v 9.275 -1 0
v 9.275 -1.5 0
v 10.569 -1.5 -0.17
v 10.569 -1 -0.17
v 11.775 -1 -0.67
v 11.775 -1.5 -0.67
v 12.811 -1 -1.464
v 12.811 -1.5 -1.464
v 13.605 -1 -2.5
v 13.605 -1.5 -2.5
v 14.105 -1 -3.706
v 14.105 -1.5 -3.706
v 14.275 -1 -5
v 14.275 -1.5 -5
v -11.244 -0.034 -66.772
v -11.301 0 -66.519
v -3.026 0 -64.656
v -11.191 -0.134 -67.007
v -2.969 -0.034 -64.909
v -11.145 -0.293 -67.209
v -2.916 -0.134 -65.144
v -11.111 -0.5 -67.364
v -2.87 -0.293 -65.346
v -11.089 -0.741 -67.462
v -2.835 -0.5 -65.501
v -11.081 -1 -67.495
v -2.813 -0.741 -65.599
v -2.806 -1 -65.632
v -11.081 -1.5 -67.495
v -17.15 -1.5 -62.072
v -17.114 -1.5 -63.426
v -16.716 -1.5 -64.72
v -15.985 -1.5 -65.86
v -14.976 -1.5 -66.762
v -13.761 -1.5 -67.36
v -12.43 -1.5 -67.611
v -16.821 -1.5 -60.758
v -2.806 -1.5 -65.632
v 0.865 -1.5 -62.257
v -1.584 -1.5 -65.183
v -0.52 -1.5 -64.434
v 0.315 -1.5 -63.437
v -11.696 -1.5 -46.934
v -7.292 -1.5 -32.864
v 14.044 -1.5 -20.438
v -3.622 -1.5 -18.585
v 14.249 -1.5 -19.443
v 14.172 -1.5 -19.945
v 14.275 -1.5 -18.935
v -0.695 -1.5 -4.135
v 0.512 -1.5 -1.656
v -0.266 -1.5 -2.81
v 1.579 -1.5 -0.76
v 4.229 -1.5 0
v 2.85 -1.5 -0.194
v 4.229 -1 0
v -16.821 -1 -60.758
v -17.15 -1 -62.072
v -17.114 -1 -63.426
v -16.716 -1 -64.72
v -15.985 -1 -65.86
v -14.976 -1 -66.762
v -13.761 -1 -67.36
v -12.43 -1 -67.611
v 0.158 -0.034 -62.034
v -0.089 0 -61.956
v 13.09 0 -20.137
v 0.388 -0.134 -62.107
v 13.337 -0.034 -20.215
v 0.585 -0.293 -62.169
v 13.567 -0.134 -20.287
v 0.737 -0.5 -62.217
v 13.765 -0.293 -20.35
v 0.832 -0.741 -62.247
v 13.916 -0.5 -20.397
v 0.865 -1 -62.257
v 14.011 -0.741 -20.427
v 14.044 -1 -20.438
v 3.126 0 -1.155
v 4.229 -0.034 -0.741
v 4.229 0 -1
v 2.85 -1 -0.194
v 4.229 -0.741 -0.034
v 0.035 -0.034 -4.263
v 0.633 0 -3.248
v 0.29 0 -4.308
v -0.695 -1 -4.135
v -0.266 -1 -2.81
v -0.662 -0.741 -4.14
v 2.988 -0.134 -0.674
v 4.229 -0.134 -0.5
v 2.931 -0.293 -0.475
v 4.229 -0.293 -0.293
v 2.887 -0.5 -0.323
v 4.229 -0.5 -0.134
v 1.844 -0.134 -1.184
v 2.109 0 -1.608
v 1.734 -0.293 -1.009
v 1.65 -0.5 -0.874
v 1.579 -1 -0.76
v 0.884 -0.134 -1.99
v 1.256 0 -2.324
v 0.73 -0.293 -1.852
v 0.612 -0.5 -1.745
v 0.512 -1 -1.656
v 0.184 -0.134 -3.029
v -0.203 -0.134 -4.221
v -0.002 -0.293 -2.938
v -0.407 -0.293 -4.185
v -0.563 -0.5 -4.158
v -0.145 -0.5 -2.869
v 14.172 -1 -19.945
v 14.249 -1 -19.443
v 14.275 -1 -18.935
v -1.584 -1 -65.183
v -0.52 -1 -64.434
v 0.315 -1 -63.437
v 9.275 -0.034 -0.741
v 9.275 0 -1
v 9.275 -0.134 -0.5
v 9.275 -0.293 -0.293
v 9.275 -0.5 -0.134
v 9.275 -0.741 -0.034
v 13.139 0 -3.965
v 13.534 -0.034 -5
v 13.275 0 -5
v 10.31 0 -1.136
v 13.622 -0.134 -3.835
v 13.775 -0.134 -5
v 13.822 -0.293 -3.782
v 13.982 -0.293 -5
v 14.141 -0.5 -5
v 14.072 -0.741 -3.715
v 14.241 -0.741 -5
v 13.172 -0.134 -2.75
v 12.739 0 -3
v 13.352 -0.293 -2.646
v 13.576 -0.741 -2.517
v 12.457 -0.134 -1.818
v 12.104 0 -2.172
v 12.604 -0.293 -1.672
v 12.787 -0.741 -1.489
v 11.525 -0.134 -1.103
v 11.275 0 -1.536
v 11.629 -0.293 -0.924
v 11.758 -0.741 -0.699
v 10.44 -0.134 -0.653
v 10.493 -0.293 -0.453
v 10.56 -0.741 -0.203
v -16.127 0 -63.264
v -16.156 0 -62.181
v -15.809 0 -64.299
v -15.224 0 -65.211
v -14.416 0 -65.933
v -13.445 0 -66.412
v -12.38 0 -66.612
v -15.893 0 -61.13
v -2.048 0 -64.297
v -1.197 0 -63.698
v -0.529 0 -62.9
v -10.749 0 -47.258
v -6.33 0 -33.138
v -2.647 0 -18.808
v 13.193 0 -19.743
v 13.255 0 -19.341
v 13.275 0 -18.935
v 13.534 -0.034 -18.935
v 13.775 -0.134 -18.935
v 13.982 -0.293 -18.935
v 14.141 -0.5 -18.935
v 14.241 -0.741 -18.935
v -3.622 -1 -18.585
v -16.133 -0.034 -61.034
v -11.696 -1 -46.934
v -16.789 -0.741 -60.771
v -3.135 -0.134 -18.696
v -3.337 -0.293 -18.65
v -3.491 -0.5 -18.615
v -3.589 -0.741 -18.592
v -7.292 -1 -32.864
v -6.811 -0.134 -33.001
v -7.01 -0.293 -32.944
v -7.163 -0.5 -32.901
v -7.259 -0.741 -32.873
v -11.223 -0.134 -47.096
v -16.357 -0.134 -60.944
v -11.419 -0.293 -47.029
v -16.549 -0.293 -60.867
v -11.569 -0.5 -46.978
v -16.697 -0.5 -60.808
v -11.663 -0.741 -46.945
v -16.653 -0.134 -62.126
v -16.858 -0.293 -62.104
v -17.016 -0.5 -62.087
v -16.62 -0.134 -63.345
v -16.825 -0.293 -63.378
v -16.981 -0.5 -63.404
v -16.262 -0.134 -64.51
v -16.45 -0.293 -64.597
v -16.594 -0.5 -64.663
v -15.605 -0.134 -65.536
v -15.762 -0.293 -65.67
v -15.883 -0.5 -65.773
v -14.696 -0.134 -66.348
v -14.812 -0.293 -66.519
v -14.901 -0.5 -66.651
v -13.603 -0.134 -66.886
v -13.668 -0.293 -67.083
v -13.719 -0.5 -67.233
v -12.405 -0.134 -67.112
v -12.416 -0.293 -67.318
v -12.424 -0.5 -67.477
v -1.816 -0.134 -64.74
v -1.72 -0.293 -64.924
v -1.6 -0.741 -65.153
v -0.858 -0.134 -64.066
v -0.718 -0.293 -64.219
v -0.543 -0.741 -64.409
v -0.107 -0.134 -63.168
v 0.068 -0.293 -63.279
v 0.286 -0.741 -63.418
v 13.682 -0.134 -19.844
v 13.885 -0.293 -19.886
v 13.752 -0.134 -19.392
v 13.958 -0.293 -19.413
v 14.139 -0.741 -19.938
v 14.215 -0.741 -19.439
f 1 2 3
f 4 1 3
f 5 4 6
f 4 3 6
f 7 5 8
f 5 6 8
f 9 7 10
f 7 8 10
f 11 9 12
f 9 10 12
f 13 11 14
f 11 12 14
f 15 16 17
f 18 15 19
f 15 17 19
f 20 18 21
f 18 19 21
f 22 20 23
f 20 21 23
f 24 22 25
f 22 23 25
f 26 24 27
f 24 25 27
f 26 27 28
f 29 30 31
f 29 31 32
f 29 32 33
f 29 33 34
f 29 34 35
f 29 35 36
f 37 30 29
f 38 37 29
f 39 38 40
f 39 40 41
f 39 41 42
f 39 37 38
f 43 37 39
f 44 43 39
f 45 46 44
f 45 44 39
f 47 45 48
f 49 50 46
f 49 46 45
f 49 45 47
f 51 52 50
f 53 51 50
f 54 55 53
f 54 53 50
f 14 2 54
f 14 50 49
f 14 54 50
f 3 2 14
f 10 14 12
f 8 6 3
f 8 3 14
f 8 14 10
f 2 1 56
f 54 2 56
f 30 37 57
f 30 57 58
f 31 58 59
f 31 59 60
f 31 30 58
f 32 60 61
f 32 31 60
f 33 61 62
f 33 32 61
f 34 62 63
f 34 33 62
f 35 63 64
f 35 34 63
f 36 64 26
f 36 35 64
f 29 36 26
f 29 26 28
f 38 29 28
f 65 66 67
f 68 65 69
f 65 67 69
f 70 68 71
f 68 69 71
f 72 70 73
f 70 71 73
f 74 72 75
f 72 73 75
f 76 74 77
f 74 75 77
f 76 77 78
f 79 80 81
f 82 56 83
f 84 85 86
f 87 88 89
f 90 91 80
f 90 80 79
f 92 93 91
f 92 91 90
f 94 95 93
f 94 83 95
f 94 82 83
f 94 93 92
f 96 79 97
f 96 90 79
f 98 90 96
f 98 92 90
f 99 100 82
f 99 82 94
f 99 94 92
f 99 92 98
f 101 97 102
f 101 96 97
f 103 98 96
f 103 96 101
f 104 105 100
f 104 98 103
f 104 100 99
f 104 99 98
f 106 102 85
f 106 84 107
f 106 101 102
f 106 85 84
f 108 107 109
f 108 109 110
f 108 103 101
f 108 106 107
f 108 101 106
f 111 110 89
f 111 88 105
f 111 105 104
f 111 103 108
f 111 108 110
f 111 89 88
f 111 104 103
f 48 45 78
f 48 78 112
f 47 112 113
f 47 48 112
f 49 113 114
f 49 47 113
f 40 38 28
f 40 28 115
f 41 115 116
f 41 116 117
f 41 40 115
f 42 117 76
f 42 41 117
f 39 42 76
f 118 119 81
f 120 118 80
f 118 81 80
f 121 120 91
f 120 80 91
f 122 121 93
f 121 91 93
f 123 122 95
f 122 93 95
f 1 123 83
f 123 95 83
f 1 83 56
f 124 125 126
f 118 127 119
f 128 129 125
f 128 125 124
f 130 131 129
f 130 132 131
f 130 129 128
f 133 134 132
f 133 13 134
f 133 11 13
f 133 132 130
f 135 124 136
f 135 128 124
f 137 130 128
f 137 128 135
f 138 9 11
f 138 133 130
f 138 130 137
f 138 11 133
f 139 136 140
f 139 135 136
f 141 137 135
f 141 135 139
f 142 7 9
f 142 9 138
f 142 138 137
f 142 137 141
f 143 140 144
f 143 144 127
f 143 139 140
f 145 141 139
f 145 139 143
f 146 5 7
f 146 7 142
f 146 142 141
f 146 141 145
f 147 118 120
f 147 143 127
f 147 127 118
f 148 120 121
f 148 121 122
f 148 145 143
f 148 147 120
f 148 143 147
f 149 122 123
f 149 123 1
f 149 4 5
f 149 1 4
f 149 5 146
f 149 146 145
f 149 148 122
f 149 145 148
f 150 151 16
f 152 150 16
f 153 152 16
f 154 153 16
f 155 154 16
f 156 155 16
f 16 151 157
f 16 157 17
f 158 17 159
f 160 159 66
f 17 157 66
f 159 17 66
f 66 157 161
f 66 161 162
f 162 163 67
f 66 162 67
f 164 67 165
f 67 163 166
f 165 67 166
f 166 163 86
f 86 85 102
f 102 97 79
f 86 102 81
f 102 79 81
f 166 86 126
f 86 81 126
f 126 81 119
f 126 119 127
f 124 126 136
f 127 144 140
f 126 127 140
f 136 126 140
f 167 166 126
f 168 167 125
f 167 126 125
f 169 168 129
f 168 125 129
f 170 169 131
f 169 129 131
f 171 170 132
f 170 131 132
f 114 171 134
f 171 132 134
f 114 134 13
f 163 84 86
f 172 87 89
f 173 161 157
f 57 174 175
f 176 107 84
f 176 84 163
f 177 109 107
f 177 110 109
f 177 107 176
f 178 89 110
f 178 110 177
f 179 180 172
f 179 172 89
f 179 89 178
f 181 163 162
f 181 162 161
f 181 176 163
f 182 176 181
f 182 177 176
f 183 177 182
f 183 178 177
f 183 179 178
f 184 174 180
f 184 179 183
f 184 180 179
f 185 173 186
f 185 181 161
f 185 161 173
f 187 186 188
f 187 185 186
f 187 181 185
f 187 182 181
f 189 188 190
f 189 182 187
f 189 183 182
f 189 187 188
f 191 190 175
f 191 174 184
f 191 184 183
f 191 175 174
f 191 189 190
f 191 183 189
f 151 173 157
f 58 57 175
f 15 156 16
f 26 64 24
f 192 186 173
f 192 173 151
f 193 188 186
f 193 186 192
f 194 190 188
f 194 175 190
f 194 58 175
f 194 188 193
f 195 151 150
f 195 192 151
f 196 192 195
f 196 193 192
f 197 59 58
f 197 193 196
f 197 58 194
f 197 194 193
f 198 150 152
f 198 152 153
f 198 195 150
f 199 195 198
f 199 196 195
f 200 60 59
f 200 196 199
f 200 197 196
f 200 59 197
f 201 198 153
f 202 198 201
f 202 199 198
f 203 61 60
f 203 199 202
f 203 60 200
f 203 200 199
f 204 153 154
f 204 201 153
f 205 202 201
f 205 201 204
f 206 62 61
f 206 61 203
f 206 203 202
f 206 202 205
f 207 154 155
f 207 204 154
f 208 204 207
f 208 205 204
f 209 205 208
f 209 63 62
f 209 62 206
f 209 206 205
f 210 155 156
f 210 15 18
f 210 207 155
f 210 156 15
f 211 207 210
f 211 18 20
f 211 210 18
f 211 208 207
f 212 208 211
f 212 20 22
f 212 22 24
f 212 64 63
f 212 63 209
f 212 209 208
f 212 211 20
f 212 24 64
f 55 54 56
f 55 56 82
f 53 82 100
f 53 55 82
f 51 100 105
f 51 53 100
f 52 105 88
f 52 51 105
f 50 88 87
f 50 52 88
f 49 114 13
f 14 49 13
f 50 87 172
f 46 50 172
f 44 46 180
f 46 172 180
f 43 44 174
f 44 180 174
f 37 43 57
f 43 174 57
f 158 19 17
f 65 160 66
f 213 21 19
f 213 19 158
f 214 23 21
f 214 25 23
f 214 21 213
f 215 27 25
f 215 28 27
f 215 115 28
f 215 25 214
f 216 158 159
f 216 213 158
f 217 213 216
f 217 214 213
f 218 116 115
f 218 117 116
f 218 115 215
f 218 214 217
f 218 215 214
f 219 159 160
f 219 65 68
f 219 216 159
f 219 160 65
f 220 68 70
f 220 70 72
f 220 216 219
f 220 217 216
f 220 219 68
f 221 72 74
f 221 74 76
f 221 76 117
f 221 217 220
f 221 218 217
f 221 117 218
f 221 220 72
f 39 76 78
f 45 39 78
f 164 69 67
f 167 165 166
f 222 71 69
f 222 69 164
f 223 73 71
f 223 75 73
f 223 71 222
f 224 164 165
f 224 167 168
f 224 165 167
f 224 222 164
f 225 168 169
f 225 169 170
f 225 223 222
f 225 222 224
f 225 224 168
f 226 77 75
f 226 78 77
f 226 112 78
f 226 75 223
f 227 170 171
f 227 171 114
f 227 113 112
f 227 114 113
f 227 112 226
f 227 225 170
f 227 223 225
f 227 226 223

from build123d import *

# Parameters (mm, degrees)
F1_DEPTH = 1.5
F2_R     = 5
F3_R     = 1


with BuildPart() as f1:
    # F0 (on Front) → F1 (new body)
    with BuildSketch(Plane.XZ):
        with BuildLine():
            Line((14.275201, 0), (0, 0))
            ThreePointArc((0, 0), (-8.047761, -35.470172), (-20.547462, -69.626534))
            Line((-20.547462, -69.626534), (0, -65))
            Line((0, -65), (14.275201, -19.70393))
            Line((14.275201, -19.70393), (14.275201, 0))
        make_face()
    extrude(amount=F1_DEPTH)

    # F2
    f2_edges = [f1.edges().sort_by_distance(p)[0] for p in [
        (-20.547462, -0.75, -69.626534),
        (0, -0.75, -65),
        (14.275201, -0.75, -19.70393),
        (14.275201, -0.75, 0),
        (0, -0.75, 0),
    ]]
    fillet(f2_edges, radius=F2_R)

    # F3
    f3_edges = [f1.edges().sort_by_distance(p)[0] for p in [
        (-7.292111, 0, -32.863957),
    ]]
    fillet(f3_edges, radius=F3_R)


solid = f1.part
